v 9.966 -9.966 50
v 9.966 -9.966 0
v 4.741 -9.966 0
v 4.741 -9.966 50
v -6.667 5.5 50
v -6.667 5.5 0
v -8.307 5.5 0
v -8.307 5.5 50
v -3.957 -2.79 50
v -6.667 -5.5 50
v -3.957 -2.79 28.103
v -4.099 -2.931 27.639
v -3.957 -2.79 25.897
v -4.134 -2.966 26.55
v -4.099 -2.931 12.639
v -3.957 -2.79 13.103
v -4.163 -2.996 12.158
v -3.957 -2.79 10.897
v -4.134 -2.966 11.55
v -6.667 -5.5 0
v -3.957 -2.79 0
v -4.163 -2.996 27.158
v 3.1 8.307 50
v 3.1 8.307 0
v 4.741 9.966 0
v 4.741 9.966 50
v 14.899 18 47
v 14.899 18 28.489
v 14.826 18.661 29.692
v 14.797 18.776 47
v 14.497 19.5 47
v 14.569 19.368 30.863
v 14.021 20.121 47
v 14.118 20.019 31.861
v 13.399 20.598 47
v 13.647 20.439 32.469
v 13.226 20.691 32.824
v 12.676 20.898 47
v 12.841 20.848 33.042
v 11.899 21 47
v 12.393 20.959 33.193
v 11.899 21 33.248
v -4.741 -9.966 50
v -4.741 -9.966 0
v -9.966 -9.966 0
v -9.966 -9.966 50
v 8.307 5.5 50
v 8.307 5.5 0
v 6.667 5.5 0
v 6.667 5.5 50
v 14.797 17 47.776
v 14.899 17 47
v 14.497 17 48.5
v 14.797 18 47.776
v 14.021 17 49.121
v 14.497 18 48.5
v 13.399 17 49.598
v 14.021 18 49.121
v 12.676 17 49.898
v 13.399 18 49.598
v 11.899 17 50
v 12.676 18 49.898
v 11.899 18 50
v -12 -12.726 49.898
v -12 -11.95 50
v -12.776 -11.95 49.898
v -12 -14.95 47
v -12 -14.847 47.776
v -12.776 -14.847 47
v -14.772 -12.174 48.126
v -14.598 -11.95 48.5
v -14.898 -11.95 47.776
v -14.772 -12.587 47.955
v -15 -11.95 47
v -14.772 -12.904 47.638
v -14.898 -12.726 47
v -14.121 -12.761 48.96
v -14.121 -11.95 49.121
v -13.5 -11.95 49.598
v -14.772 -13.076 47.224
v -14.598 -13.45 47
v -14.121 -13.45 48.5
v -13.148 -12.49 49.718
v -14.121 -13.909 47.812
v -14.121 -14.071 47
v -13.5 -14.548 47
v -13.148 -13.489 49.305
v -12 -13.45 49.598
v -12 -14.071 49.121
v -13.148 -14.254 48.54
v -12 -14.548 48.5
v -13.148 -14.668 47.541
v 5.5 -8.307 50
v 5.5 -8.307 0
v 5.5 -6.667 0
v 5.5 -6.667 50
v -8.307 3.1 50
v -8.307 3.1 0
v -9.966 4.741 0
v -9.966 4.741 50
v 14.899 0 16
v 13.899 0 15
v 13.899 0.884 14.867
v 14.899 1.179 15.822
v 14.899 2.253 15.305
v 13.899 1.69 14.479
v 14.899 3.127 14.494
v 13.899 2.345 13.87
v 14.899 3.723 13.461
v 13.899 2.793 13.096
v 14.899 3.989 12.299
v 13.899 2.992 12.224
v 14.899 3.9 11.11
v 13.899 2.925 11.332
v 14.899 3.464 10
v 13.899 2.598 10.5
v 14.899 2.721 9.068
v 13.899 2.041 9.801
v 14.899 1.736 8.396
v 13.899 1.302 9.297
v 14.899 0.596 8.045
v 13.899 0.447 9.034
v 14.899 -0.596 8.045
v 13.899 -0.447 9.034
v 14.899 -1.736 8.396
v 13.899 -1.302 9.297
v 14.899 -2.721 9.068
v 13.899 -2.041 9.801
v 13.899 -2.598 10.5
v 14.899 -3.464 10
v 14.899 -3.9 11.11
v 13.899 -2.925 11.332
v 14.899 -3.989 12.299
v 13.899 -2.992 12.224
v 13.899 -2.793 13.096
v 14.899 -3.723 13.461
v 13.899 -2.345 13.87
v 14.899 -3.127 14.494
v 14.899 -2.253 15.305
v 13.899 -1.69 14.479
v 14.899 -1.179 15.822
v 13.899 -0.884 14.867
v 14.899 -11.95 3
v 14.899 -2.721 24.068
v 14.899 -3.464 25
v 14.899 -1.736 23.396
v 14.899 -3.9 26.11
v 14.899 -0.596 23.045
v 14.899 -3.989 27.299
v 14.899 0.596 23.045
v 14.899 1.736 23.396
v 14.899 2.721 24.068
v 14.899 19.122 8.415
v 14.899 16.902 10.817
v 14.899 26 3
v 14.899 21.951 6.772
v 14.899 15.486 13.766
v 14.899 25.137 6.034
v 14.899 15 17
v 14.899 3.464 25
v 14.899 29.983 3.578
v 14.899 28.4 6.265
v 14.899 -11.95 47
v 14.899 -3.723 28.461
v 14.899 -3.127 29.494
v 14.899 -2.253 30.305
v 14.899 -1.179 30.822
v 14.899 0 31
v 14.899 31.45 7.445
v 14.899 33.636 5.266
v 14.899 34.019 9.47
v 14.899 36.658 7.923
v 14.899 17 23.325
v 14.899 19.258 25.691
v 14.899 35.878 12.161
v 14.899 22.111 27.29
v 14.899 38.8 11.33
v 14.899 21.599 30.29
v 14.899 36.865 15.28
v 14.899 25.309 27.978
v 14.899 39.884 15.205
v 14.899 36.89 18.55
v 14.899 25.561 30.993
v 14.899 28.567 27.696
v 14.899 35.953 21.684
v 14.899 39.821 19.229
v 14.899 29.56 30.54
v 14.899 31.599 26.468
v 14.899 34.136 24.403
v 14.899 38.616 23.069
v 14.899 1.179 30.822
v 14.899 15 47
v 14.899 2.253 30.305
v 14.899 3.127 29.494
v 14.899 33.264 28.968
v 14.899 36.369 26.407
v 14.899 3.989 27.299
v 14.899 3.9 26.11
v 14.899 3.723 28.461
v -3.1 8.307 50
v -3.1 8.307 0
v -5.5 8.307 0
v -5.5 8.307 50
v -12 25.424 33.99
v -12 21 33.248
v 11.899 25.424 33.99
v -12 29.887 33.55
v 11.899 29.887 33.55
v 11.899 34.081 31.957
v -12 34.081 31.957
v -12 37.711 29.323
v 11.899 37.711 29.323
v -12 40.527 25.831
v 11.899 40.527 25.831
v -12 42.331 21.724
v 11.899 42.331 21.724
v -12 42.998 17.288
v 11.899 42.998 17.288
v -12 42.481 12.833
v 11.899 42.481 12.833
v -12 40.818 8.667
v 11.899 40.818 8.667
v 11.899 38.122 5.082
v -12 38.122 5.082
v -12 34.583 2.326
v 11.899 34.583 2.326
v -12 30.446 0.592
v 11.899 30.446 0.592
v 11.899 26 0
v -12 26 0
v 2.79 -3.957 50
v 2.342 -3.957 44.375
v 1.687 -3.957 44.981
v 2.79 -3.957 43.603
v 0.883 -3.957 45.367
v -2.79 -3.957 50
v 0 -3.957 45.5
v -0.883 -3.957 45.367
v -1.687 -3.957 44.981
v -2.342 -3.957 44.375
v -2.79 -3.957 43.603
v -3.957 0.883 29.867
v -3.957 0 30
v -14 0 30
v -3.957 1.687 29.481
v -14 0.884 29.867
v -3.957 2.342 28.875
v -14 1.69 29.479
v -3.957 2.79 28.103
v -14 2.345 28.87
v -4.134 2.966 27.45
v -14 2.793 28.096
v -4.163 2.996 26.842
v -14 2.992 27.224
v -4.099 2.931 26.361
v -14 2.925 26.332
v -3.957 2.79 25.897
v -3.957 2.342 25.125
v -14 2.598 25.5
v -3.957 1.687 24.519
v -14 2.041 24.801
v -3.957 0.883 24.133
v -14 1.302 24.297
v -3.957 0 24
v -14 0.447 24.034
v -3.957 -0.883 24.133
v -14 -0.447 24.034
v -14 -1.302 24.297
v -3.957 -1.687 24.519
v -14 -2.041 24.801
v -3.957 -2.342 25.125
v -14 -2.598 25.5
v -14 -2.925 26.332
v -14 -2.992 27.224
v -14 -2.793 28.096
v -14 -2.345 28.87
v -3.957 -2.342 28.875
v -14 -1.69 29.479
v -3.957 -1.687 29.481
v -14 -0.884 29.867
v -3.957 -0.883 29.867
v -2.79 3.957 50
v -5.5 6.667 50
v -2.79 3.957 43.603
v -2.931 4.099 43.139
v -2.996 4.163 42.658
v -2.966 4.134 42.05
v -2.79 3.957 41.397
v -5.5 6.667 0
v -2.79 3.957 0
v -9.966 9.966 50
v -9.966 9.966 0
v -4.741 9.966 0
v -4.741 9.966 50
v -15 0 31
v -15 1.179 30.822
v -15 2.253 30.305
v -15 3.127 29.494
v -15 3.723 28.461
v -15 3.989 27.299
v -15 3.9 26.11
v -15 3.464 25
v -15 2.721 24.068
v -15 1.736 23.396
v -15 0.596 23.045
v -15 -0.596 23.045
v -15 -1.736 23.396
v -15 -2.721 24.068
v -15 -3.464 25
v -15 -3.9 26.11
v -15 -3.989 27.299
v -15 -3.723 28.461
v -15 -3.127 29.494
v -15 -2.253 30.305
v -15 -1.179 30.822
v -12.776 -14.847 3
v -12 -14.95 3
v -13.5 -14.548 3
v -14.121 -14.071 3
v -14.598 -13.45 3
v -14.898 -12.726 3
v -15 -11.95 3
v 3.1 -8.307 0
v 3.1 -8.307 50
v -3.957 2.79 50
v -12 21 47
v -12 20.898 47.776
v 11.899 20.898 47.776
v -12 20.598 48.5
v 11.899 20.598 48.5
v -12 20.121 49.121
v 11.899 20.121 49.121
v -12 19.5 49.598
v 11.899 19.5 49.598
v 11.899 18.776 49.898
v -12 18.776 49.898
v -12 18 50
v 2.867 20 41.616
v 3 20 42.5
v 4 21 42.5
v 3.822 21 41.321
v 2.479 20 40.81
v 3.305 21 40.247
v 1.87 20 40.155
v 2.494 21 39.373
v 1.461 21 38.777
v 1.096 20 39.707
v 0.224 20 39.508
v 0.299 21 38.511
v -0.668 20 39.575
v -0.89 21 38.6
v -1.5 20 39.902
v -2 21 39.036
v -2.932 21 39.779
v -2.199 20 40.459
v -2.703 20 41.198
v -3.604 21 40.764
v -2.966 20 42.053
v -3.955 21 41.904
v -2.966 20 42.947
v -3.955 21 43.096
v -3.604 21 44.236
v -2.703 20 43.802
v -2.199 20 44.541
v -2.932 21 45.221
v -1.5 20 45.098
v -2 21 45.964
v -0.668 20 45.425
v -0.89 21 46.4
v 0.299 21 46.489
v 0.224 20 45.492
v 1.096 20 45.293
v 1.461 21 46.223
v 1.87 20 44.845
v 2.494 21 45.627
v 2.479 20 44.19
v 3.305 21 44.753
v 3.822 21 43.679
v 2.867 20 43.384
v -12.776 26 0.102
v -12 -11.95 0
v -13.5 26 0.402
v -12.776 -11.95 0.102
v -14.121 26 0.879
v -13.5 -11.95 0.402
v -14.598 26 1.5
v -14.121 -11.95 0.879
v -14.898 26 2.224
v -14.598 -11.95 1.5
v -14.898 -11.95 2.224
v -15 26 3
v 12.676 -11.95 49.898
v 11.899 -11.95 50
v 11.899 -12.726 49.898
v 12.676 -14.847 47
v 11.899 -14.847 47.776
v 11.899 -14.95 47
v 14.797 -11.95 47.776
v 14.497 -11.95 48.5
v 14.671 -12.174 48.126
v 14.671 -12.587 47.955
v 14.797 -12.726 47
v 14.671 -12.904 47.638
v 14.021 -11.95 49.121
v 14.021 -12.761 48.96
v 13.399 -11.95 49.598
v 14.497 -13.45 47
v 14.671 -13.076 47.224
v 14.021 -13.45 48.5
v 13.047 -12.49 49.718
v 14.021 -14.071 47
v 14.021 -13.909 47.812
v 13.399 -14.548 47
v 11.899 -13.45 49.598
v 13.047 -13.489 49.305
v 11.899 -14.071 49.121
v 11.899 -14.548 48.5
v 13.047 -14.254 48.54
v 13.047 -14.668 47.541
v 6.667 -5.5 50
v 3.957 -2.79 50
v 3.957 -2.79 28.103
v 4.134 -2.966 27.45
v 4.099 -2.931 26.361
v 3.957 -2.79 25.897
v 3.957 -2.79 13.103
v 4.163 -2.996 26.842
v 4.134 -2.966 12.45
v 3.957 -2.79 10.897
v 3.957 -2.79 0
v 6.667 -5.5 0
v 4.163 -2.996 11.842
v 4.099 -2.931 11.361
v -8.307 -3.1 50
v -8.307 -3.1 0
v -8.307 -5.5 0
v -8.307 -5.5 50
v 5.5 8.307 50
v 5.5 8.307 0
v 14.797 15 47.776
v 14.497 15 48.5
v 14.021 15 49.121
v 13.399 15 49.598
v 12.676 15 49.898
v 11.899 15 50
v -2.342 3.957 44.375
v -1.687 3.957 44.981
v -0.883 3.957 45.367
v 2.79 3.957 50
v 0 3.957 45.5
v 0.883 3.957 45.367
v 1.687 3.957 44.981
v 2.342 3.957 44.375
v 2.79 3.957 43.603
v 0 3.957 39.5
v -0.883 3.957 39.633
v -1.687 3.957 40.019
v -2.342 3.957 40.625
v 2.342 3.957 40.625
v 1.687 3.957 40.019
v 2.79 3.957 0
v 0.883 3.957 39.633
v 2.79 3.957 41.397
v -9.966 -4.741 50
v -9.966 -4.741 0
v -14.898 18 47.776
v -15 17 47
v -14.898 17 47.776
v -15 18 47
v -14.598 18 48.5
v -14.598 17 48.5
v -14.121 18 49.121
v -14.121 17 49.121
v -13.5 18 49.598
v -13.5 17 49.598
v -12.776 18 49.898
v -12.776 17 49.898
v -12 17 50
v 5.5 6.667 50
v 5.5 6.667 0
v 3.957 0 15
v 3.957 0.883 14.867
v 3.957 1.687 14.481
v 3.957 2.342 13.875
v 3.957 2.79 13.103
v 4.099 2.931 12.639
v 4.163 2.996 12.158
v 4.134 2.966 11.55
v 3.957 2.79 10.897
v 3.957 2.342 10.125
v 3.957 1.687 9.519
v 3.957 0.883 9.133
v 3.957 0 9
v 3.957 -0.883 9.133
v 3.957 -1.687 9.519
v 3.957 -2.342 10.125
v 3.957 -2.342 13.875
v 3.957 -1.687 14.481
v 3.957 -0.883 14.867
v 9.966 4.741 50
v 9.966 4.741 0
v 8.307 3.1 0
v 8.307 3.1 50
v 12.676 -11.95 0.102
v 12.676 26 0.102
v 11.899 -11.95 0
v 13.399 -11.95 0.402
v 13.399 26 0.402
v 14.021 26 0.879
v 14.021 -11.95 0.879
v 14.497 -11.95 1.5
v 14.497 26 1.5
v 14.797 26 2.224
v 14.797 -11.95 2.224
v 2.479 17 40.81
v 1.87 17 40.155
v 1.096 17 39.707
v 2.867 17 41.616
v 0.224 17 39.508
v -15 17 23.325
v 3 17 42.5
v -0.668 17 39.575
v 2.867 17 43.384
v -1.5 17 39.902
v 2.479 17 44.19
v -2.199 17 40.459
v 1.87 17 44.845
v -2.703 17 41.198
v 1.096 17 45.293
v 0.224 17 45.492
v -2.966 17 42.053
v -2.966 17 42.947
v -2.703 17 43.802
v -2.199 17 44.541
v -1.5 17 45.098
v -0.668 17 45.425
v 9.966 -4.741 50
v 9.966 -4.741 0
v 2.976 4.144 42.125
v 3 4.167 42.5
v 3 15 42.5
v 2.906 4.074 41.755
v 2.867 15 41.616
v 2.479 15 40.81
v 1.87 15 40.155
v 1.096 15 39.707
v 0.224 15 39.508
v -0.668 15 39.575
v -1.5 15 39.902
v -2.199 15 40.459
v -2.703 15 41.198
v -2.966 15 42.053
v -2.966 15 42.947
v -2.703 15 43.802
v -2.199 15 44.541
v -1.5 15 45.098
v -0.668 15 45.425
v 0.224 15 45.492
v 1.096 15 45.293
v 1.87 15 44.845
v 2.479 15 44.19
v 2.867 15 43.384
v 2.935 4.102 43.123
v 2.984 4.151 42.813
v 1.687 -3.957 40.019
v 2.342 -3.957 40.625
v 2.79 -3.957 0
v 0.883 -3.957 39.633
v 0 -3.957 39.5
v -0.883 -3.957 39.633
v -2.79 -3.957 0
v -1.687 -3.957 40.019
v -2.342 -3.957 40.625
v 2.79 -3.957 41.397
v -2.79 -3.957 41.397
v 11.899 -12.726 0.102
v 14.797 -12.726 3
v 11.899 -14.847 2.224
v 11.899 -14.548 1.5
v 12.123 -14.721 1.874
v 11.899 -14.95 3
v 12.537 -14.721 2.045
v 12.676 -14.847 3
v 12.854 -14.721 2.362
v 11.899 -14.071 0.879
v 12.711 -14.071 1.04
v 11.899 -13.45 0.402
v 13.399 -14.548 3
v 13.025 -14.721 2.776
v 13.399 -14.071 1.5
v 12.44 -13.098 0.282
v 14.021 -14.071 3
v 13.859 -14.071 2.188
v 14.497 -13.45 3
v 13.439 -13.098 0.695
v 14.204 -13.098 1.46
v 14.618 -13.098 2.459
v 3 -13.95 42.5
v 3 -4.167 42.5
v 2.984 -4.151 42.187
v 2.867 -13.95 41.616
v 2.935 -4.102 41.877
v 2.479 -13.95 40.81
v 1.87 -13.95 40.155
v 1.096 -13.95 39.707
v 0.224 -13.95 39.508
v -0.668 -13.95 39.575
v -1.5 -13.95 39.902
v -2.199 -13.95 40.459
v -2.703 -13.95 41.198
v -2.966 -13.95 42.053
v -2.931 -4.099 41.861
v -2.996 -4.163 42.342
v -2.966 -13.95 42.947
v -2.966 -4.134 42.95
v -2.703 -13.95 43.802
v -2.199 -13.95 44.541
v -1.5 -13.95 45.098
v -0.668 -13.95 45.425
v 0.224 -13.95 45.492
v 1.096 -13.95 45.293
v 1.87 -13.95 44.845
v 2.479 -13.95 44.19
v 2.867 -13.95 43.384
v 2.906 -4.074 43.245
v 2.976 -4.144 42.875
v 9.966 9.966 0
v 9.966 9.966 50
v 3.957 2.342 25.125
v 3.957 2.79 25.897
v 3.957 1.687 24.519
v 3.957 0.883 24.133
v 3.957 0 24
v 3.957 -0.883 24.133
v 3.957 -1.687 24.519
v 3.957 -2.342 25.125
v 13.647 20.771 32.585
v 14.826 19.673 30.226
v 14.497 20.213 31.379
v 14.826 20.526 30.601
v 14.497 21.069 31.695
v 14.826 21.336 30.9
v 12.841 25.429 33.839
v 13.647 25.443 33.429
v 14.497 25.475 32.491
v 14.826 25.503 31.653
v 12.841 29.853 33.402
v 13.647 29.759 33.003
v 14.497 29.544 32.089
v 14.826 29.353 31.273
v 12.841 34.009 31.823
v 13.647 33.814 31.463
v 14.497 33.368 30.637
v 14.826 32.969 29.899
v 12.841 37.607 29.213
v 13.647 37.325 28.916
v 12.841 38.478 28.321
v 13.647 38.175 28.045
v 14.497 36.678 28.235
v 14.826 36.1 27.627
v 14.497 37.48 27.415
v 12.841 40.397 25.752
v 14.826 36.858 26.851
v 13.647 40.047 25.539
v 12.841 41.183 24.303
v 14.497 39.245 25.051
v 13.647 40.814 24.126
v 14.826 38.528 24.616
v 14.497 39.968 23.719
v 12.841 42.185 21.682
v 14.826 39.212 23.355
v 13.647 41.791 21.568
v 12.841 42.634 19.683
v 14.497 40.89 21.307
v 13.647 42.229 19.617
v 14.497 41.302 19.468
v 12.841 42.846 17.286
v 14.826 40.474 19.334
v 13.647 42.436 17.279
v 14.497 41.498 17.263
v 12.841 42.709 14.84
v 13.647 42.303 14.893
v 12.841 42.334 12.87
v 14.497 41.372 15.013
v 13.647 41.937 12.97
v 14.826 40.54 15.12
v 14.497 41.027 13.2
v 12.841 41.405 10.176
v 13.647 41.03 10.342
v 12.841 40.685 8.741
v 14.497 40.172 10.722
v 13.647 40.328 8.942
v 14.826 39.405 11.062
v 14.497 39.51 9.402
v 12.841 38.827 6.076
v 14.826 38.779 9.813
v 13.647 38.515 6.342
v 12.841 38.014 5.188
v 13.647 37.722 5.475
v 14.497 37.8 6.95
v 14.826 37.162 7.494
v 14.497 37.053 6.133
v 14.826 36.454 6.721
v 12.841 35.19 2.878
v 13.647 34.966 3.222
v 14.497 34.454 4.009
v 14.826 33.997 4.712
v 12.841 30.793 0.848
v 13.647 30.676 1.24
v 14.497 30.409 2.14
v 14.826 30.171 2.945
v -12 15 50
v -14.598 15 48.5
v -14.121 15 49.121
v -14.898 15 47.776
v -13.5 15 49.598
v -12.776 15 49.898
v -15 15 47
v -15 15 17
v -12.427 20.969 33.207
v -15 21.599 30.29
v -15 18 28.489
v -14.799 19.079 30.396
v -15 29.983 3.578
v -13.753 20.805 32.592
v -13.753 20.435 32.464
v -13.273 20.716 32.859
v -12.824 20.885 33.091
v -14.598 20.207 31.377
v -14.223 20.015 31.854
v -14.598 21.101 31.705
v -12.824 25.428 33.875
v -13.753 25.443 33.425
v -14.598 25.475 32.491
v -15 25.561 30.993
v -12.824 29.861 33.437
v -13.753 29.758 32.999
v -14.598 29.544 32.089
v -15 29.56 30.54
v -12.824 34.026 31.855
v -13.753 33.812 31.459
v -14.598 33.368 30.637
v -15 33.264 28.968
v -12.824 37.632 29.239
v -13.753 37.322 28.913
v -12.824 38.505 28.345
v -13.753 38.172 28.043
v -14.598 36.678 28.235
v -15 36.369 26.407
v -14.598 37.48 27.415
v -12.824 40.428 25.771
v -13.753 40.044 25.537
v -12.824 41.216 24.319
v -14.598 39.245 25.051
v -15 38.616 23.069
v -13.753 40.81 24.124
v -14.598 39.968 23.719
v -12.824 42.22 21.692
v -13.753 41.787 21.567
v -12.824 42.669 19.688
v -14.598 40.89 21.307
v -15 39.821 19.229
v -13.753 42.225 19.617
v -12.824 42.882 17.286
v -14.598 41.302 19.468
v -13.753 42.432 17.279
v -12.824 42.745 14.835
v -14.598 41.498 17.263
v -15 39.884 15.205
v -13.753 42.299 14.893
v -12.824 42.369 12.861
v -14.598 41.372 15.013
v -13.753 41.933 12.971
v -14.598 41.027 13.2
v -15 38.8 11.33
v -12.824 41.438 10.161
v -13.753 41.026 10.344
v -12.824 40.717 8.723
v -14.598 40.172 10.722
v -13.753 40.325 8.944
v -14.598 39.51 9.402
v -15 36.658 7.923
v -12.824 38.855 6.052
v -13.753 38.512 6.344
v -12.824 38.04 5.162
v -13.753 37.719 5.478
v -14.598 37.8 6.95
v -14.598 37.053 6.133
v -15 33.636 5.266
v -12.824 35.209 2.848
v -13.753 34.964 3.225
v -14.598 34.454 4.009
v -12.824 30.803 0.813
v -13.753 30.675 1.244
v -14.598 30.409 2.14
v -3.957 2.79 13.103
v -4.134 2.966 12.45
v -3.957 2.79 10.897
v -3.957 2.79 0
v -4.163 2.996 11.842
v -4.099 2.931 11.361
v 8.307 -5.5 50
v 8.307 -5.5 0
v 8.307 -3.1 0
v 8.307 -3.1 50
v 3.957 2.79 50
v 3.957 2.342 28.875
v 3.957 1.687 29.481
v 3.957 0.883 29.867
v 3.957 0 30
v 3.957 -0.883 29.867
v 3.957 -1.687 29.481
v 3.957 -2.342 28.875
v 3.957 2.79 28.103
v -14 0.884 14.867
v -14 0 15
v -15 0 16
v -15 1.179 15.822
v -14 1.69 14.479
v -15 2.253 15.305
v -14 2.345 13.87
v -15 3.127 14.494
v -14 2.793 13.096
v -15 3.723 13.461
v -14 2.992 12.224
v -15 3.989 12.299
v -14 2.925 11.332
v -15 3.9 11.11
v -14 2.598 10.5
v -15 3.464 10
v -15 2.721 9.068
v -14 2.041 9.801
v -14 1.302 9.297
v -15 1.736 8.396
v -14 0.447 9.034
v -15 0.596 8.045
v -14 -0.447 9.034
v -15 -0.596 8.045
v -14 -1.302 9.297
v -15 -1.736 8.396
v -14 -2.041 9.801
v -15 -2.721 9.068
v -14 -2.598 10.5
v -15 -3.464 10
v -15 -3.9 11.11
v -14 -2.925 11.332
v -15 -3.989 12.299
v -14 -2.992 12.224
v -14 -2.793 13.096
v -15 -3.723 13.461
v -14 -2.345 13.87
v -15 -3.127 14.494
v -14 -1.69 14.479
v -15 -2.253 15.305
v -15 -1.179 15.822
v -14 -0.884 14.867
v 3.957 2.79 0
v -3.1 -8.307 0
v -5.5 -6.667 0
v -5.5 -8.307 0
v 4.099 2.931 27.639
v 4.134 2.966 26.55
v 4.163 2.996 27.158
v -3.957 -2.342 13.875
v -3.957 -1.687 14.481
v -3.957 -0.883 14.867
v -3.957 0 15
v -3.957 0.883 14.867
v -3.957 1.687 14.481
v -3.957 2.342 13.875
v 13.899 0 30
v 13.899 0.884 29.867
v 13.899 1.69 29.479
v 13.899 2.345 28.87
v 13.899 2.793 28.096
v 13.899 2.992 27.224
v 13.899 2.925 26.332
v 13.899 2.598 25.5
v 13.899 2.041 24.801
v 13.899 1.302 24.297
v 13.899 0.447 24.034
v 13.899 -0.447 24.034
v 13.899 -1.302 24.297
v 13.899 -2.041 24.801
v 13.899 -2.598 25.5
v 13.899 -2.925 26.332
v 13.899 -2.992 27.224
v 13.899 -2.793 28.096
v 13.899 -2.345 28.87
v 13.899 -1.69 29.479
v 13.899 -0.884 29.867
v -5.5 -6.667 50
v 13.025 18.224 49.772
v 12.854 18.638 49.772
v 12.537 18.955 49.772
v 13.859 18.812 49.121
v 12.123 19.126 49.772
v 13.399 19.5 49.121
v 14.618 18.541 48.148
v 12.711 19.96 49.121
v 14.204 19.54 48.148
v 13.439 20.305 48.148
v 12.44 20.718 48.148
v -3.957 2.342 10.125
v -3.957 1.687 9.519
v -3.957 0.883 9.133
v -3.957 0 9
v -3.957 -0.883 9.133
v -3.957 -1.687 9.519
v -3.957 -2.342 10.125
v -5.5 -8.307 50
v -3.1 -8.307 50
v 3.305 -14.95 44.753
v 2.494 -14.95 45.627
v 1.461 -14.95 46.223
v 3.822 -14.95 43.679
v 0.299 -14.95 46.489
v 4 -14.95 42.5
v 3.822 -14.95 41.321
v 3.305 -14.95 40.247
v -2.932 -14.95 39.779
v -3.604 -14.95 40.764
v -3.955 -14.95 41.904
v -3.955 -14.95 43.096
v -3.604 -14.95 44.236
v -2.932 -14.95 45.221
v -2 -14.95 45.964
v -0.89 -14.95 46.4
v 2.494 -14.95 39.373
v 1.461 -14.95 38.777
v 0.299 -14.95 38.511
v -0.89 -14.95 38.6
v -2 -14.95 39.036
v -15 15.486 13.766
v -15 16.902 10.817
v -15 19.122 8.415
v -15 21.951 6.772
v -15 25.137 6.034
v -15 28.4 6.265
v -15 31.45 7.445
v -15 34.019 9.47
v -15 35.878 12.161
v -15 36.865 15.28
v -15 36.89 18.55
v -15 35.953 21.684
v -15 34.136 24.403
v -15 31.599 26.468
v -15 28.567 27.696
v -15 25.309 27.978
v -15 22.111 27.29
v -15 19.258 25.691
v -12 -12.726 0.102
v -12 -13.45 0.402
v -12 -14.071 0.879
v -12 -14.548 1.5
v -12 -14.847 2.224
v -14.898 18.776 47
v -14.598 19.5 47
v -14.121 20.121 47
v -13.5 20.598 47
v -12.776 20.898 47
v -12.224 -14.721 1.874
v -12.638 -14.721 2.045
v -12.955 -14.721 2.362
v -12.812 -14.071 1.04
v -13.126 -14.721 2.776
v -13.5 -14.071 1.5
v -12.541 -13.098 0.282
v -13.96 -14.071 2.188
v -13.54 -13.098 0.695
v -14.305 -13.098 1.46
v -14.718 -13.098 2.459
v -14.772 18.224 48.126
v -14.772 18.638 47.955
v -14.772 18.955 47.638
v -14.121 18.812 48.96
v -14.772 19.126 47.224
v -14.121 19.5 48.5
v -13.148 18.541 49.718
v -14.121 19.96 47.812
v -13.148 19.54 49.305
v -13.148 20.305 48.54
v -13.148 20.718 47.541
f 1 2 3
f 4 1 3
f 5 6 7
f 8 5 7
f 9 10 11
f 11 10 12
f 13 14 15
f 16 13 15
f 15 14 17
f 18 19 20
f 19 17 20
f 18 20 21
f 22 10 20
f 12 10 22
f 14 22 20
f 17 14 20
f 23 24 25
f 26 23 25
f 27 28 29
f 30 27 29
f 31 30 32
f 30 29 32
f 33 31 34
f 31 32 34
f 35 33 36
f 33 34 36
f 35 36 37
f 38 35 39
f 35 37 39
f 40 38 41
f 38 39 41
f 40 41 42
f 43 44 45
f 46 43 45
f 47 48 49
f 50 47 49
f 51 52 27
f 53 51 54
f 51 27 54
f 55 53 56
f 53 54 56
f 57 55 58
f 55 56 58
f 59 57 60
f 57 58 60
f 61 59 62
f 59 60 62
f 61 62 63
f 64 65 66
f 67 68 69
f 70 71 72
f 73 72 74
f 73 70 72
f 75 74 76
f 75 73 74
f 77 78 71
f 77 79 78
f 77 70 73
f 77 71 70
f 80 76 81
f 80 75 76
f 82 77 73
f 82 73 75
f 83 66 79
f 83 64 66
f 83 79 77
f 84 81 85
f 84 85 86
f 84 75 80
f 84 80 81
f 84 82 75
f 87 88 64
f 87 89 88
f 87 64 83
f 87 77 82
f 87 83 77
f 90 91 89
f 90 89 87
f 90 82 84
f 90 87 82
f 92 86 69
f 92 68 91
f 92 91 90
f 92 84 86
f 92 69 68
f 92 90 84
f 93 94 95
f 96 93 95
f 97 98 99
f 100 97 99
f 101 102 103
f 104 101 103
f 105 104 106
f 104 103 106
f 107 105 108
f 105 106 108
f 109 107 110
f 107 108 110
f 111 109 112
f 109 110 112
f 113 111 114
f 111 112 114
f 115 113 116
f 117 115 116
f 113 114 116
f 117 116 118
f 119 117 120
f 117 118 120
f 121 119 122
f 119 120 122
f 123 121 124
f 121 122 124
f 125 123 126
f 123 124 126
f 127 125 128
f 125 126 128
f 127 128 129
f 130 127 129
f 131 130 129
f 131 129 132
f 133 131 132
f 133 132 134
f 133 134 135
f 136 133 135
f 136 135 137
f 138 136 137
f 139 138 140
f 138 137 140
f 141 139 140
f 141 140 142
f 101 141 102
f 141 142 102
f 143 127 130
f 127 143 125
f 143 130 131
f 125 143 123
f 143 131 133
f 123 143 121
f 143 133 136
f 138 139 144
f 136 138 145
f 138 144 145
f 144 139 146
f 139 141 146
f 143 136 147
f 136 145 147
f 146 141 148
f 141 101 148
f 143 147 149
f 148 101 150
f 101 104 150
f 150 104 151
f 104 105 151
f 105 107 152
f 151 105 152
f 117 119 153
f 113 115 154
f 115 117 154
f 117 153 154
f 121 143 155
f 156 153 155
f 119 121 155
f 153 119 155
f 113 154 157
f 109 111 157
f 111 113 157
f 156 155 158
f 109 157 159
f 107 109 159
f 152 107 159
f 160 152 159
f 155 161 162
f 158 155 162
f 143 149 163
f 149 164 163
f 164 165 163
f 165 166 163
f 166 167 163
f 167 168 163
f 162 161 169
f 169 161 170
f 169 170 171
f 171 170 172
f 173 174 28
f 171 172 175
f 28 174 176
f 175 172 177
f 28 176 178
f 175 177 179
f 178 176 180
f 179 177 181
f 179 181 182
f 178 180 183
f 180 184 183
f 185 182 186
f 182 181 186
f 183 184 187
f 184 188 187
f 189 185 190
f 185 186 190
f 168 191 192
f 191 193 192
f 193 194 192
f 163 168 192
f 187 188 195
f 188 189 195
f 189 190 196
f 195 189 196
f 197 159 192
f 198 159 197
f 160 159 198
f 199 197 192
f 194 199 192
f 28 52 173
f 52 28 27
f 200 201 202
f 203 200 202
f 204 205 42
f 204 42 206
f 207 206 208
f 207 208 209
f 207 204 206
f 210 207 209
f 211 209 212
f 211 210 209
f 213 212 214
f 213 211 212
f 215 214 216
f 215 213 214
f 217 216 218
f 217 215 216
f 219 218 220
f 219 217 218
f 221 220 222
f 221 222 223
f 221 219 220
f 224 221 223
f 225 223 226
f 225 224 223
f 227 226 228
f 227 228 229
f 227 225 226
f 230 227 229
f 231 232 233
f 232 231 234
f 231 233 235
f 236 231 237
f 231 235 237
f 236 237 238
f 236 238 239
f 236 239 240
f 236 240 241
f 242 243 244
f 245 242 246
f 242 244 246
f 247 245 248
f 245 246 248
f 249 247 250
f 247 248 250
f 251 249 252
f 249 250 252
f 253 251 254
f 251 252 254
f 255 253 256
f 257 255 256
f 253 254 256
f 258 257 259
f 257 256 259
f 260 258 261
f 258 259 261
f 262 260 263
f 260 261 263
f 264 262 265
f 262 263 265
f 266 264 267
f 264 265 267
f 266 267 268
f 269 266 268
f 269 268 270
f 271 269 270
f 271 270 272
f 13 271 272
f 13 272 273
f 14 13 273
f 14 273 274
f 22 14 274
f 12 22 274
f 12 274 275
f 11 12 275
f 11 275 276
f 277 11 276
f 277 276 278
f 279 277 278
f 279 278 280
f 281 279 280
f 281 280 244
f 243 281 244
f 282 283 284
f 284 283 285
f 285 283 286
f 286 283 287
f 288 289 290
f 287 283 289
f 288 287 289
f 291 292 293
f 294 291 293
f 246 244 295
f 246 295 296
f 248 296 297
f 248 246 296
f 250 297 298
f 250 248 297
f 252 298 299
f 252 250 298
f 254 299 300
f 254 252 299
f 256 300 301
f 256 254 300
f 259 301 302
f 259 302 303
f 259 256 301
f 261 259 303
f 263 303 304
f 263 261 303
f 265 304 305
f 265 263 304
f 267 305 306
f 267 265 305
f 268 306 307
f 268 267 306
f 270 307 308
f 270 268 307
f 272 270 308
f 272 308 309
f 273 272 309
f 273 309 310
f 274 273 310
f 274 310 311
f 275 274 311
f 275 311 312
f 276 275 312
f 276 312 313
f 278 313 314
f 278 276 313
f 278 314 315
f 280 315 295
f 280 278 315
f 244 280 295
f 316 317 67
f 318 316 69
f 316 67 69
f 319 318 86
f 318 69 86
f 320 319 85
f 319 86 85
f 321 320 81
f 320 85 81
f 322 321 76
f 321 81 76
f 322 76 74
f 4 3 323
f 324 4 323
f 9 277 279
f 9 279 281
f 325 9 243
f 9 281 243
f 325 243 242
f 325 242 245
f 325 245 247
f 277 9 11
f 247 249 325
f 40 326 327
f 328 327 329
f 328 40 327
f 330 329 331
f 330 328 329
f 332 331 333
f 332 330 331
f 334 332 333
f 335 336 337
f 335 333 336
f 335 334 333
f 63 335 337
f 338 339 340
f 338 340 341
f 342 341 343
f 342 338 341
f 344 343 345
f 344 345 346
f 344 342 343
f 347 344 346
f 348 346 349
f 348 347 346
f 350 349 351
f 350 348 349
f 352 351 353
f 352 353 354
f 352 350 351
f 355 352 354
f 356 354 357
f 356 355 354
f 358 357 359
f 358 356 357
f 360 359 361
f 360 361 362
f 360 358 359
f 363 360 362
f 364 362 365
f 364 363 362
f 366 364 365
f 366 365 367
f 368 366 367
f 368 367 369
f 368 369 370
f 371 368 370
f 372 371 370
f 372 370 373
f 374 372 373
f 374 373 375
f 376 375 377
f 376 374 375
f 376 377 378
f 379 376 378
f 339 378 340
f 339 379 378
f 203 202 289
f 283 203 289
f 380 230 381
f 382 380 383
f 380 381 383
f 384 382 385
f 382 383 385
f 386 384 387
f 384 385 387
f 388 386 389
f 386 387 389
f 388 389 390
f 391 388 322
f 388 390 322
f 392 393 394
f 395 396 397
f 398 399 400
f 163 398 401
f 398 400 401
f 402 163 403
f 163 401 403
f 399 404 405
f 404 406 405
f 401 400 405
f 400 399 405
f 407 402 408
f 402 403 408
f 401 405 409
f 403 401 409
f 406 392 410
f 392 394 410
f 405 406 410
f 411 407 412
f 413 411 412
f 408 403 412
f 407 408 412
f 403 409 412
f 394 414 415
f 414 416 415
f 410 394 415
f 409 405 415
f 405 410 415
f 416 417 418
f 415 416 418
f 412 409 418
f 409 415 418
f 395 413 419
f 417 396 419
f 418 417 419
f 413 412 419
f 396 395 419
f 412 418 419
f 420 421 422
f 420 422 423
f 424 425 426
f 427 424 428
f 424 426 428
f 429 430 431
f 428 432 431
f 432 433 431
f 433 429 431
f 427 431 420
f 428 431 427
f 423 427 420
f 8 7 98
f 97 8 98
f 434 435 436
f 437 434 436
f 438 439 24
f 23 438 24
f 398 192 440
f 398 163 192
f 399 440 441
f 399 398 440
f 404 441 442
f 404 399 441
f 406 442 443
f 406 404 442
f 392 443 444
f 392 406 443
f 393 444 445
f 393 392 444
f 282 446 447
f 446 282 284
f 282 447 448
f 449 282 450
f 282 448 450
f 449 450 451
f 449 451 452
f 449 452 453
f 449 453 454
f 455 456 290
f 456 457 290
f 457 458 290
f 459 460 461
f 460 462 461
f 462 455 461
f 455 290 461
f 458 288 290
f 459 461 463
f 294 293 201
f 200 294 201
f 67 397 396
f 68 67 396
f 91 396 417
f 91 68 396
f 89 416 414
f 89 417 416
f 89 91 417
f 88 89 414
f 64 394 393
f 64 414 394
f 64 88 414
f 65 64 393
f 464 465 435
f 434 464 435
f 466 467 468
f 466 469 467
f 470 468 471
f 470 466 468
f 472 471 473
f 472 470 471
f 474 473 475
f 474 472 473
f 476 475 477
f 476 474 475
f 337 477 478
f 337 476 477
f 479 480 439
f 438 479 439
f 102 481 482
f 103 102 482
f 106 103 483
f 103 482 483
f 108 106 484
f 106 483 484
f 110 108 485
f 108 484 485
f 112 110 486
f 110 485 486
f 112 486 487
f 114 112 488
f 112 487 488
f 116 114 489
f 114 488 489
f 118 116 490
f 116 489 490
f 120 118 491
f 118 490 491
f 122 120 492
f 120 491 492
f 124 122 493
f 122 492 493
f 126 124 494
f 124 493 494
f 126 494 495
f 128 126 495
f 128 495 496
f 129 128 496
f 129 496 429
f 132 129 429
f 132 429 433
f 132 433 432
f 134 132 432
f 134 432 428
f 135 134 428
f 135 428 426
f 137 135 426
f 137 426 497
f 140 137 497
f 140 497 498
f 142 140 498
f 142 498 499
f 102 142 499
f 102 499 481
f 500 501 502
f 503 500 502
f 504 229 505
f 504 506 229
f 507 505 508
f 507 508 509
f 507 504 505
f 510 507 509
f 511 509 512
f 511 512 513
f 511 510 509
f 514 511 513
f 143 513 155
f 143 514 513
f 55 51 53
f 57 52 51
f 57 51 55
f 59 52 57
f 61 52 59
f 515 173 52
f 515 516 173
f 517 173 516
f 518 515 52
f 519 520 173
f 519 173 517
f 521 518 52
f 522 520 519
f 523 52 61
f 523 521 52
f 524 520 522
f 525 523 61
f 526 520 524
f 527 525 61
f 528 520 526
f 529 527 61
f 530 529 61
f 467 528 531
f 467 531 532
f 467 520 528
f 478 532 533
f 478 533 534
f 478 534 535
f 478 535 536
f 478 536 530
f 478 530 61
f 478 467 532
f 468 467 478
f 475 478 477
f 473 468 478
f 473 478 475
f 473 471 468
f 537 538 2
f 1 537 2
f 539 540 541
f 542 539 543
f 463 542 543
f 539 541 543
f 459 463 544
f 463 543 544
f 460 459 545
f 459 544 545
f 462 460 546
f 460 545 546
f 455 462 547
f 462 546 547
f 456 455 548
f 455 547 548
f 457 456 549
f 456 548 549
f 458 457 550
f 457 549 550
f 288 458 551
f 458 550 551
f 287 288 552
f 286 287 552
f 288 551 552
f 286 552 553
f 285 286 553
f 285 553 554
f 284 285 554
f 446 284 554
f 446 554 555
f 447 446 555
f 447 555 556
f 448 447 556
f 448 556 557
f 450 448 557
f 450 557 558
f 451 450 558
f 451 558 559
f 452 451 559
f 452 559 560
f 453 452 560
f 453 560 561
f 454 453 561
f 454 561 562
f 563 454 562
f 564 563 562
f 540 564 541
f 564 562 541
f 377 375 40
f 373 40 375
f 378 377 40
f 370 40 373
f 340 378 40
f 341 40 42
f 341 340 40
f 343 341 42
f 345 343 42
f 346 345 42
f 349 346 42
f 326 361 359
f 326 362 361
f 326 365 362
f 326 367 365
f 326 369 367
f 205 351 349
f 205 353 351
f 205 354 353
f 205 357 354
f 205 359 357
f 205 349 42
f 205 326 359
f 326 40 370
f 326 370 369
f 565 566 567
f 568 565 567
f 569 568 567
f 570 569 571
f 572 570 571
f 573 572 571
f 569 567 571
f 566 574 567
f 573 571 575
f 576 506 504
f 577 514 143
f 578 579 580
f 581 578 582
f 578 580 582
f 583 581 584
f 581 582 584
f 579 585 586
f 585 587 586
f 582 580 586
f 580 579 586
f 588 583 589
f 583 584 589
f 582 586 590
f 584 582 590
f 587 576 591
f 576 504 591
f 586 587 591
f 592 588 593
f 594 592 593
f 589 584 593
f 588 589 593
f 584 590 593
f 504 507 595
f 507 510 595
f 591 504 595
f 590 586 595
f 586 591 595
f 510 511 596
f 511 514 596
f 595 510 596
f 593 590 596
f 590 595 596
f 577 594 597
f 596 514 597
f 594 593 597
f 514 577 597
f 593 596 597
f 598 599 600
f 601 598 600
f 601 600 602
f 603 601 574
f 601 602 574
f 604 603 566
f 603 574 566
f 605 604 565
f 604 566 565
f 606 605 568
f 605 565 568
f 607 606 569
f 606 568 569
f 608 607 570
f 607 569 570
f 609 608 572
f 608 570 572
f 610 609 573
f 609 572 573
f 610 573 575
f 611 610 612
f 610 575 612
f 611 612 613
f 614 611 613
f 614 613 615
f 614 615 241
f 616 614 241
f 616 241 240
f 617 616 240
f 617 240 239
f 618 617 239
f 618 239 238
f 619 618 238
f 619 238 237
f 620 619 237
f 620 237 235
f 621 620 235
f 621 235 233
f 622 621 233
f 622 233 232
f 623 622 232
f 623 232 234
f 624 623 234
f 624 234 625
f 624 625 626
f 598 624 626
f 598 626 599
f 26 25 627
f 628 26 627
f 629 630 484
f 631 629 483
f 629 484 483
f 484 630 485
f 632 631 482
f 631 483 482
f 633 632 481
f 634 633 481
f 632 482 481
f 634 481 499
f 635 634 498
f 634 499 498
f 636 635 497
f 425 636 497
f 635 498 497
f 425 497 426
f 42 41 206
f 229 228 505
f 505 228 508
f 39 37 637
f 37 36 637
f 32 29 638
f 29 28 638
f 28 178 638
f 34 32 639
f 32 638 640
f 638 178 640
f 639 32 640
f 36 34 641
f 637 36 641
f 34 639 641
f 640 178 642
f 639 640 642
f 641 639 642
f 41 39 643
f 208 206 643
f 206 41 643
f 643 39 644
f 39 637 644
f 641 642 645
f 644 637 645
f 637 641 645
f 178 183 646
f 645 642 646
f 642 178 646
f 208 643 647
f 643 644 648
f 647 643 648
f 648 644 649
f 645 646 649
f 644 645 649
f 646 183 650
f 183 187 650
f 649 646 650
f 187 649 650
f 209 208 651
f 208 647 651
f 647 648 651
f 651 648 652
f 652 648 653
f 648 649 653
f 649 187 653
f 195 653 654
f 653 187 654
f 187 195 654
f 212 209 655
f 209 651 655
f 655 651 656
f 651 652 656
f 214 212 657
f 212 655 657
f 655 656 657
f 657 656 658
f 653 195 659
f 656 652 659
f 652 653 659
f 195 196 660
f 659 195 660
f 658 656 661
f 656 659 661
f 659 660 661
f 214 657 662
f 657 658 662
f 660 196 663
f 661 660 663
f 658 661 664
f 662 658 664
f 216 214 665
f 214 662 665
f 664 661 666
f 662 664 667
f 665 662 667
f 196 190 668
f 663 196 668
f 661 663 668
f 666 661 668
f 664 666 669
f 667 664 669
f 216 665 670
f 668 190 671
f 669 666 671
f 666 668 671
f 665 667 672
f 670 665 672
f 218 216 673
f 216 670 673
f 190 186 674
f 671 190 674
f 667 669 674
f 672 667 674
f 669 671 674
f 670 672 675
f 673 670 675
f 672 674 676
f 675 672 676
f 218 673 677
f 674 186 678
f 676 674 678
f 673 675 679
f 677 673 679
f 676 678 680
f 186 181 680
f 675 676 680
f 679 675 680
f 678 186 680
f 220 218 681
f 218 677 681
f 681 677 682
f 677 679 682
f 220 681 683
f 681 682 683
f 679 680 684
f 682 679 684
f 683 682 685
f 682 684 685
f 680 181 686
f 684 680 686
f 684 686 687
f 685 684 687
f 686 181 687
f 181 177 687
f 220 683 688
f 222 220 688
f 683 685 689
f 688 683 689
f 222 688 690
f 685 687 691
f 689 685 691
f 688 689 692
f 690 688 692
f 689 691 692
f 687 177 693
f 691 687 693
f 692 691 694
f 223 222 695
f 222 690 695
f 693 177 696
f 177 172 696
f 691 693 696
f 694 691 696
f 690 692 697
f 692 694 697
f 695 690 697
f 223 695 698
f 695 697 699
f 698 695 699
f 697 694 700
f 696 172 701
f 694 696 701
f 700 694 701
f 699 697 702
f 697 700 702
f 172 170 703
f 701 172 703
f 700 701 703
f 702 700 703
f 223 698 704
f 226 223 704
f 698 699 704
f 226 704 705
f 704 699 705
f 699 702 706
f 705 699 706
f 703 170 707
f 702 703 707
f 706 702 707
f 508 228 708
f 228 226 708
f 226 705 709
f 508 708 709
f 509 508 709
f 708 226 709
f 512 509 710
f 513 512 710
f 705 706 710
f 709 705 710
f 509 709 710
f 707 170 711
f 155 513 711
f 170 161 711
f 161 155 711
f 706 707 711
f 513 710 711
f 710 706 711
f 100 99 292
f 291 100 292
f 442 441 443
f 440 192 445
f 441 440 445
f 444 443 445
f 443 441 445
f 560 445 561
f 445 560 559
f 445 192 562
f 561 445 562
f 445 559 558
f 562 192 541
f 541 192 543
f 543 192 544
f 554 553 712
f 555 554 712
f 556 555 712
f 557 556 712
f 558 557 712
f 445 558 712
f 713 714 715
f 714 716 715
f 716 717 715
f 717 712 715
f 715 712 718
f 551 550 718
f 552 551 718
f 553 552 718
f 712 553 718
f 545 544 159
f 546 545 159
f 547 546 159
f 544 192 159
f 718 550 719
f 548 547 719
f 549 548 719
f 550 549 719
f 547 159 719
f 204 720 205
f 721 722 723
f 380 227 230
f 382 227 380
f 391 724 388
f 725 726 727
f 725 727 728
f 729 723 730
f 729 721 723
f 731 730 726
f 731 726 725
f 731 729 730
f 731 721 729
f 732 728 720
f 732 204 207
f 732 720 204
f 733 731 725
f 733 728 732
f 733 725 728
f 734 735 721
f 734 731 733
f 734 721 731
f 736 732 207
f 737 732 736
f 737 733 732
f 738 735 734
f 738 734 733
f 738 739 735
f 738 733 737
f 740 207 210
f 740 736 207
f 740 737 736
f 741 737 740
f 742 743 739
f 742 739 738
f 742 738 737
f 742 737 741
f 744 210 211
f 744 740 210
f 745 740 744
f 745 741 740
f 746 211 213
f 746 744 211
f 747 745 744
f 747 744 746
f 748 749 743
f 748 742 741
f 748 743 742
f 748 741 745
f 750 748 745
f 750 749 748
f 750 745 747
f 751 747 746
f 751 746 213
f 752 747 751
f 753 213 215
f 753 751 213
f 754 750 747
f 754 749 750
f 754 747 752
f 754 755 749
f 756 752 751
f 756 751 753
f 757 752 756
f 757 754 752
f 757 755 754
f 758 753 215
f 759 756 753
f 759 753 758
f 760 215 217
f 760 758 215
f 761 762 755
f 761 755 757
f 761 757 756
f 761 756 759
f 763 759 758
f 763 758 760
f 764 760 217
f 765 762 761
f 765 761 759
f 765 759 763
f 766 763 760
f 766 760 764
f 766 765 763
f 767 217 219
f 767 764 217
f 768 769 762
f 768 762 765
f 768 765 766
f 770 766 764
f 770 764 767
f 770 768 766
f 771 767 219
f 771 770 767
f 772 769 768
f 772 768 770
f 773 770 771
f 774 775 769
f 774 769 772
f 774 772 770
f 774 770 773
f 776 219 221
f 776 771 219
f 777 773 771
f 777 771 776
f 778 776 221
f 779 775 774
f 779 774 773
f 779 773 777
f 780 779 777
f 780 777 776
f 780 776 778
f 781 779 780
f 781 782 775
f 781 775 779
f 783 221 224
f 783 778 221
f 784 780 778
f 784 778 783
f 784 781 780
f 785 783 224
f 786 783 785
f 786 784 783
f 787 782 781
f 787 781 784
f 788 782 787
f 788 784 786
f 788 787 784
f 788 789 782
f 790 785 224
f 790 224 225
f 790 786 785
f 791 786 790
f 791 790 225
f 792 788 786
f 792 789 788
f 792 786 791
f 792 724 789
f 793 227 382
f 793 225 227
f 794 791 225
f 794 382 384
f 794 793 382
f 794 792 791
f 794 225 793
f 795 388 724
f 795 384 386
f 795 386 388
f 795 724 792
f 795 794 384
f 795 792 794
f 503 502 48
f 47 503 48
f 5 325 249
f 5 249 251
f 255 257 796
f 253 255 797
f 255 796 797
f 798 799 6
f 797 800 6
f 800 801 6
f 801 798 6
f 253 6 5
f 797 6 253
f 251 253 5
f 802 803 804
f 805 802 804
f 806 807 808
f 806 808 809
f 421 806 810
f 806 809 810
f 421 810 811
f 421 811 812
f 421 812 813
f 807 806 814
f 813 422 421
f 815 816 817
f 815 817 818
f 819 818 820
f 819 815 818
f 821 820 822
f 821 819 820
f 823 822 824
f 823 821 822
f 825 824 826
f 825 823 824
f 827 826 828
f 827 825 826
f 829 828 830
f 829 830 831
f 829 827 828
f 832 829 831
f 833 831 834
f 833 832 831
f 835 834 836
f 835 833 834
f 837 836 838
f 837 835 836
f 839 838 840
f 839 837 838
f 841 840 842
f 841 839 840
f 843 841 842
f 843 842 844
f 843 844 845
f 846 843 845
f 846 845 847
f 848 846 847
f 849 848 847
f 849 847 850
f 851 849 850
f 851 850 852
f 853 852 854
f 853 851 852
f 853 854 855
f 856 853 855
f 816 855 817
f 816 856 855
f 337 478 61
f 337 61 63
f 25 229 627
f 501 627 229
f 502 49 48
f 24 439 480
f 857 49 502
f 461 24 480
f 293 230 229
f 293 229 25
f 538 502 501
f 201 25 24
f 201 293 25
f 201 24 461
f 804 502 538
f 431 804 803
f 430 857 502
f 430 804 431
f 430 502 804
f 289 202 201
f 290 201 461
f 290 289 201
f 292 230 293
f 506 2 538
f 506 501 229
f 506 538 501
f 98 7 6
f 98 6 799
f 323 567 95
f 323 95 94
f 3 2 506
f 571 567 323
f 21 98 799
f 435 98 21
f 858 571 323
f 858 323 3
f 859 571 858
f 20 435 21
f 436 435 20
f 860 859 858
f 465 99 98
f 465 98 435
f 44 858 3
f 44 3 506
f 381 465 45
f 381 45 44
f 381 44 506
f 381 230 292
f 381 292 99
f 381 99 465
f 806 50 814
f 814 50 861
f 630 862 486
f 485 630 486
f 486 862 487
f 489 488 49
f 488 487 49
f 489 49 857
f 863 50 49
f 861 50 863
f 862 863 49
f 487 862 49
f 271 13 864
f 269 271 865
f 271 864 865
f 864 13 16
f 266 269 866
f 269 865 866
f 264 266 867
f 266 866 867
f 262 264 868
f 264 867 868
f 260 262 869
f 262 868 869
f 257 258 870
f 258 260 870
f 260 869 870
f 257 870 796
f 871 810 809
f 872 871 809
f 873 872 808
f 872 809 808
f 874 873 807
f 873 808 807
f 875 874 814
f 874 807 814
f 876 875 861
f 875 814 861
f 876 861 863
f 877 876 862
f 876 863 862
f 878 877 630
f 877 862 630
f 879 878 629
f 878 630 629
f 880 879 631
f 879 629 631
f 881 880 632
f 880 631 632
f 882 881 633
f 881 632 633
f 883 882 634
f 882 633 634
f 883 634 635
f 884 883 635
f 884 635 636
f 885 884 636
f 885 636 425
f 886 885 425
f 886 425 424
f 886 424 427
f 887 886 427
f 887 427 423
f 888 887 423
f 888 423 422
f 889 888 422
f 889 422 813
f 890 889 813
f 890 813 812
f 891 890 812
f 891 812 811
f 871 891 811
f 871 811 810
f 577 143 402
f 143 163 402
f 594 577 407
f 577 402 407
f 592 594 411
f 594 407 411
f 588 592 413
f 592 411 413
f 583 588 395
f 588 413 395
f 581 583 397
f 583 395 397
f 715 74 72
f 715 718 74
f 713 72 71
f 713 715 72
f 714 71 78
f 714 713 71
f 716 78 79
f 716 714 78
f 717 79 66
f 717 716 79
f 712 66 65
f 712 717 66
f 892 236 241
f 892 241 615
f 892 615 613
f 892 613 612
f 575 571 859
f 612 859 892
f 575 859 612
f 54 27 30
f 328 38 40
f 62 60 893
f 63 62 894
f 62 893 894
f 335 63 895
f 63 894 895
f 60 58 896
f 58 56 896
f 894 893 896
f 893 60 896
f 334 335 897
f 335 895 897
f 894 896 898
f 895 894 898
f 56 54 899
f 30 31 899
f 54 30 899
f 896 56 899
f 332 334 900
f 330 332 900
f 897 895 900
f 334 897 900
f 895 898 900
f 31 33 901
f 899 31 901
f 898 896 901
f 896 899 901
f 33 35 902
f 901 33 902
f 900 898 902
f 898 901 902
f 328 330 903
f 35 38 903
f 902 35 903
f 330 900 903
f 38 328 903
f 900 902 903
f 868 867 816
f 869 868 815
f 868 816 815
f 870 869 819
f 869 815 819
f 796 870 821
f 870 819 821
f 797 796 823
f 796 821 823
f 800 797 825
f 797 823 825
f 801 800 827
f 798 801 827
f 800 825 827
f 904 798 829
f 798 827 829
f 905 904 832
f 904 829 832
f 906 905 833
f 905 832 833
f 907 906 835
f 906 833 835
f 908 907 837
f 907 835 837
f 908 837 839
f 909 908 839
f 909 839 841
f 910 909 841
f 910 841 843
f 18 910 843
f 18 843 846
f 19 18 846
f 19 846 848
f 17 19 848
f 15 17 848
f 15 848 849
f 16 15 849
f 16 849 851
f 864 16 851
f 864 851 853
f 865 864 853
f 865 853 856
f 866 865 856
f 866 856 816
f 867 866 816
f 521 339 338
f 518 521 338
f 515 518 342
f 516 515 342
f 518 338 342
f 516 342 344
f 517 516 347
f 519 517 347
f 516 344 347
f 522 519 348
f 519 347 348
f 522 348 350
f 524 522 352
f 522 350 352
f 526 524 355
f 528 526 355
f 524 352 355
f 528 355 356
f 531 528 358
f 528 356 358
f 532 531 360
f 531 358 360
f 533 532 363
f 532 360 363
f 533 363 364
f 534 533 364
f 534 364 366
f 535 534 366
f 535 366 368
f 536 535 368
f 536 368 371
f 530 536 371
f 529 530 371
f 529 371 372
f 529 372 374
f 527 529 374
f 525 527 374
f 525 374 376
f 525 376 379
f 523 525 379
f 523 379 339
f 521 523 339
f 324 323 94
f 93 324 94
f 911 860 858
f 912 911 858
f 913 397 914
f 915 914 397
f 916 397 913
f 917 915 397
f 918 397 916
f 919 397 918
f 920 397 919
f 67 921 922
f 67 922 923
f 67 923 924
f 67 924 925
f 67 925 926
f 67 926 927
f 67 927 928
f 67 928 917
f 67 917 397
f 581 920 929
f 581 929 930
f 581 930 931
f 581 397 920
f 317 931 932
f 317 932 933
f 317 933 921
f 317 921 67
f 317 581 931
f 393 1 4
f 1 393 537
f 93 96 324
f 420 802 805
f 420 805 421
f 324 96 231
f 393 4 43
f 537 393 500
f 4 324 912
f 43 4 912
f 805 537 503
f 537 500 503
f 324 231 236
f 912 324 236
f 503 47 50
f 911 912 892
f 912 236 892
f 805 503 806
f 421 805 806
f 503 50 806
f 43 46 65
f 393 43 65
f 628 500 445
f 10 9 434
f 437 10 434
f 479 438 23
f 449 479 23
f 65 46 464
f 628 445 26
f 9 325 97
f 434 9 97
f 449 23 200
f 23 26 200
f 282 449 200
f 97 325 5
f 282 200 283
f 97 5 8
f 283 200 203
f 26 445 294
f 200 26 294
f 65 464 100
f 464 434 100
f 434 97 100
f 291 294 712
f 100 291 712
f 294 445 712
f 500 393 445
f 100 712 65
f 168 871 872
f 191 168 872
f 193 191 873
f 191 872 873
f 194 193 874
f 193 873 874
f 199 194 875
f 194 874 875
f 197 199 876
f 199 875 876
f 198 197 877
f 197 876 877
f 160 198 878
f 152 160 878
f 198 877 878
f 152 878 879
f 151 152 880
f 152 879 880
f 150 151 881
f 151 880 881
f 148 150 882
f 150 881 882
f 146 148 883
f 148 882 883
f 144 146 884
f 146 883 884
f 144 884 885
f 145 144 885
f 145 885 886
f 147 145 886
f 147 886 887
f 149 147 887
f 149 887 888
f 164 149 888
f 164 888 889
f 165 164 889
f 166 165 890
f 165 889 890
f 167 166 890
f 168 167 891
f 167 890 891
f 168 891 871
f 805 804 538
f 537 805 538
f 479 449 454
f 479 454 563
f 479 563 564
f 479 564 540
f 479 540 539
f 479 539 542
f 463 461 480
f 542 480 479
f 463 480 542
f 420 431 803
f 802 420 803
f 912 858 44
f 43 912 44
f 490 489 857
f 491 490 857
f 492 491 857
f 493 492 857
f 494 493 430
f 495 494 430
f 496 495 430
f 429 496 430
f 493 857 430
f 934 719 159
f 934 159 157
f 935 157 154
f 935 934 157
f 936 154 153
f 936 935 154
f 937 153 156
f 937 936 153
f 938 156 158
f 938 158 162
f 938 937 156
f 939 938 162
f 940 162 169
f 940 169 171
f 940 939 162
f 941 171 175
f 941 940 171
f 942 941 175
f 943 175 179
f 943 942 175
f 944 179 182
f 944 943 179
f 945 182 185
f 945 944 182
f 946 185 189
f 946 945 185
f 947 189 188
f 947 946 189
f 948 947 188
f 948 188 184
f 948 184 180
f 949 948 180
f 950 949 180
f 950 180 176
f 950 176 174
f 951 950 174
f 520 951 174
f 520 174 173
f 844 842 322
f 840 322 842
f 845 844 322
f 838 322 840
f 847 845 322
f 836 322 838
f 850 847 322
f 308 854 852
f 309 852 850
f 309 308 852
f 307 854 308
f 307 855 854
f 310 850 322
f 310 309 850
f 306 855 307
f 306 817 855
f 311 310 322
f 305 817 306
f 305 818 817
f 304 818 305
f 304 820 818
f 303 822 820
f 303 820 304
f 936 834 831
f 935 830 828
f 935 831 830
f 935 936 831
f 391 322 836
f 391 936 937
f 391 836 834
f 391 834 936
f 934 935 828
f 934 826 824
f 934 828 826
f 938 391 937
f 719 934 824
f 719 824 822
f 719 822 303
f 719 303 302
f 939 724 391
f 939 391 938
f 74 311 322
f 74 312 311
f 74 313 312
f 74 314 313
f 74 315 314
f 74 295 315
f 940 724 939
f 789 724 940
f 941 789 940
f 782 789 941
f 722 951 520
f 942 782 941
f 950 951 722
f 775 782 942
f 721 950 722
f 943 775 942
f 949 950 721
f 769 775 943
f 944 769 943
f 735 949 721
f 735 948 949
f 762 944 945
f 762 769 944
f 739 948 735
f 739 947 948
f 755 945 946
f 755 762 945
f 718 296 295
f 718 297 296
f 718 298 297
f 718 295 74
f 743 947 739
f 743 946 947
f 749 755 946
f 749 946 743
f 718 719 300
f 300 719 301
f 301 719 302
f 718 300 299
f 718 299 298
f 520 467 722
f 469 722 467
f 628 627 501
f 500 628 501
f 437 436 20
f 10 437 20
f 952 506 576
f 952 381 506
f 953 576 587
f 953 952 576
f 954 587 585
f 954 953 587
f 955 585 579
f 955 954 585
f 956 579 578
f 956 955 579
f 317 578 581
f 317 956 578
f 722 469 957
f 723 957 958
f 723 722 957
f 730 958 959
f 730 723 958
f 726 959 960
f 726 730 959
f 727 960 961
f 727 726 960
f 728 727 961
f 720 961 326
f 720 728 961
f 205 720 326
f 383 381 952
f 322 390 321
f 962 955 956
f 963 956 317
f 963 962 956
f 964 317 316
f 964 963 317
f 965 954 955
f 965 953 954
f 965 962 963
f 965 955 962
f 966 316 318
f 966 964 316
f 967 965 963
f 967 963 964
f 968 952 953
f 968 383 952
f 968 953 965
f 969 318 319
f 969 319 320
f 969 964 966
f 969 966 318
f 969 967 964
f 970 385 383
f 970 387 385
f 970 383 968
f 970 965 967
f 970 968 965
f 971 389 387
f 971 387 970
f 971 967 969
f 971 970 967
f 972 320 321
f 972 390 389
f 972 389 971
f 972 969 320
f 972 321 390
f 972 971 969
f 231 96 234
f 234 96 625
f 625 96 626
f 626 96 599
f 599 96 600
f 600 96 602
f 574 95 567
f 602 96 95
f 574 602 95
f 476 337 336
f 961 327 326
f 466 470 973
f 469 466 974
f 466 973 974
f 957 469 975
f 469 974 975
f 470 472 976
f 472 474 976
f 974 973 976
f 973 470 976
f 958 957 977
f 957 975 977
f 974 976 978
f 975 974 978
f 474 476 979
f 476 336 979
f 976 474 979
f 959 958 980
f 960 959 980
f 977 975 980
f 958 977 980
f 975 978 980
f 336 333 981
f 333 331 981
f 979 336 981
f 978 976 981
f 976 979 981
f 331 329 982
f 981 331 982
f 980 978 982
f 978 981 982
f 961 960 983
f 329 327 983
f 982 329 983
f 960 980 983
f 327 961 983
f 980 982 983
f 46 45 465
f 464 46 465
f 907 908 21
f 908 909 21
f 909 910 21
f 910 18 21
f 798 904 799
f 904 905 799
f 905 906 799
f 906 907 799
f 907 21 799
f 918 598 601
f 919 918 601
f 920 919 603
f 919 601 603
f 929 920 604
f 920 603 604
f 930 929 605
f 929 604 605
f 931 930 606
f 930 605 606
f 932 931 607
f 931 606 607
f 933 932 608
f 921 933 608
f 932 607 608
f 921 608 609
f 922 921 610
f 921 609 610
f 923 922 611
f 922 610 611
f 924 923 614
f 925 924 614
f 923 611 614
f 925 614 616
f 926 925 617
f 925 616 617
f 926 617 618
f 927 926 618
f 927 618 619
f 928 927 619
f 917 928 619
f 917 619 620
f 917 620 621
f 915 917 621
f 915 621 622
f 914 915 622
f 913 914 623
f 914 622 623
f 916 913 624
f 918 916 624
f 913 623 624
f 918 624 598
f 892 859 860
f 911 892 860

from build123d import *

# Parameters (mm, degrees)
BOSS_EXTRUDE1_DEPTH = 50
BOSS_EXTRUDE3_DEPTH = 29.899298
SKETCH3_R           = 3
CUT_EXTRUDE1_DEPTH  = 30.899298
SKETCH4_R           = 3
CUT_EXTRUDE2_DEPTH  = 38.007847
FILLET1_R           = 3
CHAMFER1_SIZE       = 1


with BuildPart() as part:
    # Sketch1 → Boss-Extrude1 (new body)
    with BuildSketch(Plane.XY):
        Polygon((0, 15), (14.899298, 15), (14.899298, -14.949649), (-15, -14.949649), (-15, 15), align=None)
        Polygon((-9.966433, 9.966433), (-4.741433, 9.966433), (-3.1, 8.307461), (-5.5, 8.307461), (-5.5, 6.667461), (-2.79, 3.957461), (2.79, 3.957461), (5.5, 6.667461), (5.5, 8.307461), (3.1, 8.307461), (4.741433, 9.966433), (9.966433, 9.966433), (9.966433, 4.741433), (8.307461, 3.1), (8.307461, 5.5), (6.667461, 5.5), (3.957461, 2.79), (3.957461, -2.79), (6.667461, -5.5), (8.307461, -5.5), (8.307461, -3.1), (9.966433, -4.741433), (9.966433, -9.966433), (4.741433, -9.966433), (3.1, -8.307461), (5.5, -8.307461), (5.5, -6.667461), (2.79, -3.957461), (-2.79, -3.957461), (-5.5, -6.667461), (-5.5, -8.307461), (-3.1, -8.307461), (-4.741433, -9.966433), (-9.966433, -9.966433), (-9.966433, -4.741433), (-8.307461, -3.1), (-8.307461, -5.5), (-6.667461, -5.5), (-3.957461, -2.79), (-3.957461, 2.79), (-6.667461, 5.5), (-8.307461, 5.5), (-8.307461, 3.1), (-9.966433, 4.741433), align=None, mode=Mode.SUBTRACT)
    extrude(amount=BOSS_EXTRUDE1_DEPTH)

    # Sketch5 → Boss-Extrude3 (add, through all)
    with BuildSketch(Plane.ZY.offset(15)):
        with BuildLine():
            Line((0, 26), (0, 15))
            Line((0, 15), (17, 15))
            ThreePointArc((17, 15), (13.683375, 36.488088), (23.324555, 17))
            Line((23.324555, 17), (27.804488, 17))
            Line((27.804488, 17), (50, 17))
            Line((50, 17), (50, 21))
            Line((50, 21), (33.248077, 21))
            ThreePointArc((33.248077, 21), (19.528111, 42.810968), (0, 26))
        make_face()
    extrude(amount=-BOSS_EXTRUDE3_DEPTH)

    # Sketch3 → Cut-Extrude1 (cut, through all)
    with BuildSketch(Plane.ZY.offset(15)):
        with Locations((12, 0)):
            Circle(SKETCH3_R)
        with Locations((27, 0)):
            Circle(SKETCH3_R)
    extrude(amount=-CUT_EXTRUDE1_DEPTH, mode=Mode.SUBTRACT)

    # Sketch4 → Cut-Extrude2 (cut, through all)
    with BuildSketch(Plane(origin=(0, 22.058198, 0), x_dir=(1, 0, 0), z_dir=(0, 1, 0))):
        with Locations((0, -42.5)):
            Circle(SKETCH4_R)
    extrude(amount=-CUT_EXTRUDE2_DEPTH, mode=Mode.SUBTRACT)

    # Fillet1
    fillet1_edges = [part.edges().sort_by_distance(p)[0] for p in [
        (-0.050351, -14.949649, 50),
        (14.899298, 0.025175, 50),
        (14.899298, 42.810968, 19.528111),
        (14.899298, 21, 41.624038),
        (14.899298, 19, 50),
        (-0.050351, 21, 50),
        (-15, 19, 50),
        (-15, 21, 41.624038),
        (-15, 42.810968, 19.528111),
        (14.899298, 0.025175, 0),
        (-0.050351, -14.949649, 0),
        (-15, 5.525175, 0),
        (-15, 0.025175, 50),
        (14.899298, -14.949649, 25),
        (-15, -14.949649, 25),
    ]]
    fillet(fillet1_edges, radius=FILLET1_R)

    # Chamfer1
    chamfer1_edges = [part.edges().sort_by_distance(p)[0] for p in [
        (14.899298, 0, 9),
        (-15, 0, 9),
        (14.899298, 0, 24),
        (-15, 0, 24),
        (-3, -14.949649, 42.5),
        (-3, 21, 42.5),
    ]]
    chamfer(chamfer1_edges, length=CHAMFER1_SIZE)


solid = part.part
